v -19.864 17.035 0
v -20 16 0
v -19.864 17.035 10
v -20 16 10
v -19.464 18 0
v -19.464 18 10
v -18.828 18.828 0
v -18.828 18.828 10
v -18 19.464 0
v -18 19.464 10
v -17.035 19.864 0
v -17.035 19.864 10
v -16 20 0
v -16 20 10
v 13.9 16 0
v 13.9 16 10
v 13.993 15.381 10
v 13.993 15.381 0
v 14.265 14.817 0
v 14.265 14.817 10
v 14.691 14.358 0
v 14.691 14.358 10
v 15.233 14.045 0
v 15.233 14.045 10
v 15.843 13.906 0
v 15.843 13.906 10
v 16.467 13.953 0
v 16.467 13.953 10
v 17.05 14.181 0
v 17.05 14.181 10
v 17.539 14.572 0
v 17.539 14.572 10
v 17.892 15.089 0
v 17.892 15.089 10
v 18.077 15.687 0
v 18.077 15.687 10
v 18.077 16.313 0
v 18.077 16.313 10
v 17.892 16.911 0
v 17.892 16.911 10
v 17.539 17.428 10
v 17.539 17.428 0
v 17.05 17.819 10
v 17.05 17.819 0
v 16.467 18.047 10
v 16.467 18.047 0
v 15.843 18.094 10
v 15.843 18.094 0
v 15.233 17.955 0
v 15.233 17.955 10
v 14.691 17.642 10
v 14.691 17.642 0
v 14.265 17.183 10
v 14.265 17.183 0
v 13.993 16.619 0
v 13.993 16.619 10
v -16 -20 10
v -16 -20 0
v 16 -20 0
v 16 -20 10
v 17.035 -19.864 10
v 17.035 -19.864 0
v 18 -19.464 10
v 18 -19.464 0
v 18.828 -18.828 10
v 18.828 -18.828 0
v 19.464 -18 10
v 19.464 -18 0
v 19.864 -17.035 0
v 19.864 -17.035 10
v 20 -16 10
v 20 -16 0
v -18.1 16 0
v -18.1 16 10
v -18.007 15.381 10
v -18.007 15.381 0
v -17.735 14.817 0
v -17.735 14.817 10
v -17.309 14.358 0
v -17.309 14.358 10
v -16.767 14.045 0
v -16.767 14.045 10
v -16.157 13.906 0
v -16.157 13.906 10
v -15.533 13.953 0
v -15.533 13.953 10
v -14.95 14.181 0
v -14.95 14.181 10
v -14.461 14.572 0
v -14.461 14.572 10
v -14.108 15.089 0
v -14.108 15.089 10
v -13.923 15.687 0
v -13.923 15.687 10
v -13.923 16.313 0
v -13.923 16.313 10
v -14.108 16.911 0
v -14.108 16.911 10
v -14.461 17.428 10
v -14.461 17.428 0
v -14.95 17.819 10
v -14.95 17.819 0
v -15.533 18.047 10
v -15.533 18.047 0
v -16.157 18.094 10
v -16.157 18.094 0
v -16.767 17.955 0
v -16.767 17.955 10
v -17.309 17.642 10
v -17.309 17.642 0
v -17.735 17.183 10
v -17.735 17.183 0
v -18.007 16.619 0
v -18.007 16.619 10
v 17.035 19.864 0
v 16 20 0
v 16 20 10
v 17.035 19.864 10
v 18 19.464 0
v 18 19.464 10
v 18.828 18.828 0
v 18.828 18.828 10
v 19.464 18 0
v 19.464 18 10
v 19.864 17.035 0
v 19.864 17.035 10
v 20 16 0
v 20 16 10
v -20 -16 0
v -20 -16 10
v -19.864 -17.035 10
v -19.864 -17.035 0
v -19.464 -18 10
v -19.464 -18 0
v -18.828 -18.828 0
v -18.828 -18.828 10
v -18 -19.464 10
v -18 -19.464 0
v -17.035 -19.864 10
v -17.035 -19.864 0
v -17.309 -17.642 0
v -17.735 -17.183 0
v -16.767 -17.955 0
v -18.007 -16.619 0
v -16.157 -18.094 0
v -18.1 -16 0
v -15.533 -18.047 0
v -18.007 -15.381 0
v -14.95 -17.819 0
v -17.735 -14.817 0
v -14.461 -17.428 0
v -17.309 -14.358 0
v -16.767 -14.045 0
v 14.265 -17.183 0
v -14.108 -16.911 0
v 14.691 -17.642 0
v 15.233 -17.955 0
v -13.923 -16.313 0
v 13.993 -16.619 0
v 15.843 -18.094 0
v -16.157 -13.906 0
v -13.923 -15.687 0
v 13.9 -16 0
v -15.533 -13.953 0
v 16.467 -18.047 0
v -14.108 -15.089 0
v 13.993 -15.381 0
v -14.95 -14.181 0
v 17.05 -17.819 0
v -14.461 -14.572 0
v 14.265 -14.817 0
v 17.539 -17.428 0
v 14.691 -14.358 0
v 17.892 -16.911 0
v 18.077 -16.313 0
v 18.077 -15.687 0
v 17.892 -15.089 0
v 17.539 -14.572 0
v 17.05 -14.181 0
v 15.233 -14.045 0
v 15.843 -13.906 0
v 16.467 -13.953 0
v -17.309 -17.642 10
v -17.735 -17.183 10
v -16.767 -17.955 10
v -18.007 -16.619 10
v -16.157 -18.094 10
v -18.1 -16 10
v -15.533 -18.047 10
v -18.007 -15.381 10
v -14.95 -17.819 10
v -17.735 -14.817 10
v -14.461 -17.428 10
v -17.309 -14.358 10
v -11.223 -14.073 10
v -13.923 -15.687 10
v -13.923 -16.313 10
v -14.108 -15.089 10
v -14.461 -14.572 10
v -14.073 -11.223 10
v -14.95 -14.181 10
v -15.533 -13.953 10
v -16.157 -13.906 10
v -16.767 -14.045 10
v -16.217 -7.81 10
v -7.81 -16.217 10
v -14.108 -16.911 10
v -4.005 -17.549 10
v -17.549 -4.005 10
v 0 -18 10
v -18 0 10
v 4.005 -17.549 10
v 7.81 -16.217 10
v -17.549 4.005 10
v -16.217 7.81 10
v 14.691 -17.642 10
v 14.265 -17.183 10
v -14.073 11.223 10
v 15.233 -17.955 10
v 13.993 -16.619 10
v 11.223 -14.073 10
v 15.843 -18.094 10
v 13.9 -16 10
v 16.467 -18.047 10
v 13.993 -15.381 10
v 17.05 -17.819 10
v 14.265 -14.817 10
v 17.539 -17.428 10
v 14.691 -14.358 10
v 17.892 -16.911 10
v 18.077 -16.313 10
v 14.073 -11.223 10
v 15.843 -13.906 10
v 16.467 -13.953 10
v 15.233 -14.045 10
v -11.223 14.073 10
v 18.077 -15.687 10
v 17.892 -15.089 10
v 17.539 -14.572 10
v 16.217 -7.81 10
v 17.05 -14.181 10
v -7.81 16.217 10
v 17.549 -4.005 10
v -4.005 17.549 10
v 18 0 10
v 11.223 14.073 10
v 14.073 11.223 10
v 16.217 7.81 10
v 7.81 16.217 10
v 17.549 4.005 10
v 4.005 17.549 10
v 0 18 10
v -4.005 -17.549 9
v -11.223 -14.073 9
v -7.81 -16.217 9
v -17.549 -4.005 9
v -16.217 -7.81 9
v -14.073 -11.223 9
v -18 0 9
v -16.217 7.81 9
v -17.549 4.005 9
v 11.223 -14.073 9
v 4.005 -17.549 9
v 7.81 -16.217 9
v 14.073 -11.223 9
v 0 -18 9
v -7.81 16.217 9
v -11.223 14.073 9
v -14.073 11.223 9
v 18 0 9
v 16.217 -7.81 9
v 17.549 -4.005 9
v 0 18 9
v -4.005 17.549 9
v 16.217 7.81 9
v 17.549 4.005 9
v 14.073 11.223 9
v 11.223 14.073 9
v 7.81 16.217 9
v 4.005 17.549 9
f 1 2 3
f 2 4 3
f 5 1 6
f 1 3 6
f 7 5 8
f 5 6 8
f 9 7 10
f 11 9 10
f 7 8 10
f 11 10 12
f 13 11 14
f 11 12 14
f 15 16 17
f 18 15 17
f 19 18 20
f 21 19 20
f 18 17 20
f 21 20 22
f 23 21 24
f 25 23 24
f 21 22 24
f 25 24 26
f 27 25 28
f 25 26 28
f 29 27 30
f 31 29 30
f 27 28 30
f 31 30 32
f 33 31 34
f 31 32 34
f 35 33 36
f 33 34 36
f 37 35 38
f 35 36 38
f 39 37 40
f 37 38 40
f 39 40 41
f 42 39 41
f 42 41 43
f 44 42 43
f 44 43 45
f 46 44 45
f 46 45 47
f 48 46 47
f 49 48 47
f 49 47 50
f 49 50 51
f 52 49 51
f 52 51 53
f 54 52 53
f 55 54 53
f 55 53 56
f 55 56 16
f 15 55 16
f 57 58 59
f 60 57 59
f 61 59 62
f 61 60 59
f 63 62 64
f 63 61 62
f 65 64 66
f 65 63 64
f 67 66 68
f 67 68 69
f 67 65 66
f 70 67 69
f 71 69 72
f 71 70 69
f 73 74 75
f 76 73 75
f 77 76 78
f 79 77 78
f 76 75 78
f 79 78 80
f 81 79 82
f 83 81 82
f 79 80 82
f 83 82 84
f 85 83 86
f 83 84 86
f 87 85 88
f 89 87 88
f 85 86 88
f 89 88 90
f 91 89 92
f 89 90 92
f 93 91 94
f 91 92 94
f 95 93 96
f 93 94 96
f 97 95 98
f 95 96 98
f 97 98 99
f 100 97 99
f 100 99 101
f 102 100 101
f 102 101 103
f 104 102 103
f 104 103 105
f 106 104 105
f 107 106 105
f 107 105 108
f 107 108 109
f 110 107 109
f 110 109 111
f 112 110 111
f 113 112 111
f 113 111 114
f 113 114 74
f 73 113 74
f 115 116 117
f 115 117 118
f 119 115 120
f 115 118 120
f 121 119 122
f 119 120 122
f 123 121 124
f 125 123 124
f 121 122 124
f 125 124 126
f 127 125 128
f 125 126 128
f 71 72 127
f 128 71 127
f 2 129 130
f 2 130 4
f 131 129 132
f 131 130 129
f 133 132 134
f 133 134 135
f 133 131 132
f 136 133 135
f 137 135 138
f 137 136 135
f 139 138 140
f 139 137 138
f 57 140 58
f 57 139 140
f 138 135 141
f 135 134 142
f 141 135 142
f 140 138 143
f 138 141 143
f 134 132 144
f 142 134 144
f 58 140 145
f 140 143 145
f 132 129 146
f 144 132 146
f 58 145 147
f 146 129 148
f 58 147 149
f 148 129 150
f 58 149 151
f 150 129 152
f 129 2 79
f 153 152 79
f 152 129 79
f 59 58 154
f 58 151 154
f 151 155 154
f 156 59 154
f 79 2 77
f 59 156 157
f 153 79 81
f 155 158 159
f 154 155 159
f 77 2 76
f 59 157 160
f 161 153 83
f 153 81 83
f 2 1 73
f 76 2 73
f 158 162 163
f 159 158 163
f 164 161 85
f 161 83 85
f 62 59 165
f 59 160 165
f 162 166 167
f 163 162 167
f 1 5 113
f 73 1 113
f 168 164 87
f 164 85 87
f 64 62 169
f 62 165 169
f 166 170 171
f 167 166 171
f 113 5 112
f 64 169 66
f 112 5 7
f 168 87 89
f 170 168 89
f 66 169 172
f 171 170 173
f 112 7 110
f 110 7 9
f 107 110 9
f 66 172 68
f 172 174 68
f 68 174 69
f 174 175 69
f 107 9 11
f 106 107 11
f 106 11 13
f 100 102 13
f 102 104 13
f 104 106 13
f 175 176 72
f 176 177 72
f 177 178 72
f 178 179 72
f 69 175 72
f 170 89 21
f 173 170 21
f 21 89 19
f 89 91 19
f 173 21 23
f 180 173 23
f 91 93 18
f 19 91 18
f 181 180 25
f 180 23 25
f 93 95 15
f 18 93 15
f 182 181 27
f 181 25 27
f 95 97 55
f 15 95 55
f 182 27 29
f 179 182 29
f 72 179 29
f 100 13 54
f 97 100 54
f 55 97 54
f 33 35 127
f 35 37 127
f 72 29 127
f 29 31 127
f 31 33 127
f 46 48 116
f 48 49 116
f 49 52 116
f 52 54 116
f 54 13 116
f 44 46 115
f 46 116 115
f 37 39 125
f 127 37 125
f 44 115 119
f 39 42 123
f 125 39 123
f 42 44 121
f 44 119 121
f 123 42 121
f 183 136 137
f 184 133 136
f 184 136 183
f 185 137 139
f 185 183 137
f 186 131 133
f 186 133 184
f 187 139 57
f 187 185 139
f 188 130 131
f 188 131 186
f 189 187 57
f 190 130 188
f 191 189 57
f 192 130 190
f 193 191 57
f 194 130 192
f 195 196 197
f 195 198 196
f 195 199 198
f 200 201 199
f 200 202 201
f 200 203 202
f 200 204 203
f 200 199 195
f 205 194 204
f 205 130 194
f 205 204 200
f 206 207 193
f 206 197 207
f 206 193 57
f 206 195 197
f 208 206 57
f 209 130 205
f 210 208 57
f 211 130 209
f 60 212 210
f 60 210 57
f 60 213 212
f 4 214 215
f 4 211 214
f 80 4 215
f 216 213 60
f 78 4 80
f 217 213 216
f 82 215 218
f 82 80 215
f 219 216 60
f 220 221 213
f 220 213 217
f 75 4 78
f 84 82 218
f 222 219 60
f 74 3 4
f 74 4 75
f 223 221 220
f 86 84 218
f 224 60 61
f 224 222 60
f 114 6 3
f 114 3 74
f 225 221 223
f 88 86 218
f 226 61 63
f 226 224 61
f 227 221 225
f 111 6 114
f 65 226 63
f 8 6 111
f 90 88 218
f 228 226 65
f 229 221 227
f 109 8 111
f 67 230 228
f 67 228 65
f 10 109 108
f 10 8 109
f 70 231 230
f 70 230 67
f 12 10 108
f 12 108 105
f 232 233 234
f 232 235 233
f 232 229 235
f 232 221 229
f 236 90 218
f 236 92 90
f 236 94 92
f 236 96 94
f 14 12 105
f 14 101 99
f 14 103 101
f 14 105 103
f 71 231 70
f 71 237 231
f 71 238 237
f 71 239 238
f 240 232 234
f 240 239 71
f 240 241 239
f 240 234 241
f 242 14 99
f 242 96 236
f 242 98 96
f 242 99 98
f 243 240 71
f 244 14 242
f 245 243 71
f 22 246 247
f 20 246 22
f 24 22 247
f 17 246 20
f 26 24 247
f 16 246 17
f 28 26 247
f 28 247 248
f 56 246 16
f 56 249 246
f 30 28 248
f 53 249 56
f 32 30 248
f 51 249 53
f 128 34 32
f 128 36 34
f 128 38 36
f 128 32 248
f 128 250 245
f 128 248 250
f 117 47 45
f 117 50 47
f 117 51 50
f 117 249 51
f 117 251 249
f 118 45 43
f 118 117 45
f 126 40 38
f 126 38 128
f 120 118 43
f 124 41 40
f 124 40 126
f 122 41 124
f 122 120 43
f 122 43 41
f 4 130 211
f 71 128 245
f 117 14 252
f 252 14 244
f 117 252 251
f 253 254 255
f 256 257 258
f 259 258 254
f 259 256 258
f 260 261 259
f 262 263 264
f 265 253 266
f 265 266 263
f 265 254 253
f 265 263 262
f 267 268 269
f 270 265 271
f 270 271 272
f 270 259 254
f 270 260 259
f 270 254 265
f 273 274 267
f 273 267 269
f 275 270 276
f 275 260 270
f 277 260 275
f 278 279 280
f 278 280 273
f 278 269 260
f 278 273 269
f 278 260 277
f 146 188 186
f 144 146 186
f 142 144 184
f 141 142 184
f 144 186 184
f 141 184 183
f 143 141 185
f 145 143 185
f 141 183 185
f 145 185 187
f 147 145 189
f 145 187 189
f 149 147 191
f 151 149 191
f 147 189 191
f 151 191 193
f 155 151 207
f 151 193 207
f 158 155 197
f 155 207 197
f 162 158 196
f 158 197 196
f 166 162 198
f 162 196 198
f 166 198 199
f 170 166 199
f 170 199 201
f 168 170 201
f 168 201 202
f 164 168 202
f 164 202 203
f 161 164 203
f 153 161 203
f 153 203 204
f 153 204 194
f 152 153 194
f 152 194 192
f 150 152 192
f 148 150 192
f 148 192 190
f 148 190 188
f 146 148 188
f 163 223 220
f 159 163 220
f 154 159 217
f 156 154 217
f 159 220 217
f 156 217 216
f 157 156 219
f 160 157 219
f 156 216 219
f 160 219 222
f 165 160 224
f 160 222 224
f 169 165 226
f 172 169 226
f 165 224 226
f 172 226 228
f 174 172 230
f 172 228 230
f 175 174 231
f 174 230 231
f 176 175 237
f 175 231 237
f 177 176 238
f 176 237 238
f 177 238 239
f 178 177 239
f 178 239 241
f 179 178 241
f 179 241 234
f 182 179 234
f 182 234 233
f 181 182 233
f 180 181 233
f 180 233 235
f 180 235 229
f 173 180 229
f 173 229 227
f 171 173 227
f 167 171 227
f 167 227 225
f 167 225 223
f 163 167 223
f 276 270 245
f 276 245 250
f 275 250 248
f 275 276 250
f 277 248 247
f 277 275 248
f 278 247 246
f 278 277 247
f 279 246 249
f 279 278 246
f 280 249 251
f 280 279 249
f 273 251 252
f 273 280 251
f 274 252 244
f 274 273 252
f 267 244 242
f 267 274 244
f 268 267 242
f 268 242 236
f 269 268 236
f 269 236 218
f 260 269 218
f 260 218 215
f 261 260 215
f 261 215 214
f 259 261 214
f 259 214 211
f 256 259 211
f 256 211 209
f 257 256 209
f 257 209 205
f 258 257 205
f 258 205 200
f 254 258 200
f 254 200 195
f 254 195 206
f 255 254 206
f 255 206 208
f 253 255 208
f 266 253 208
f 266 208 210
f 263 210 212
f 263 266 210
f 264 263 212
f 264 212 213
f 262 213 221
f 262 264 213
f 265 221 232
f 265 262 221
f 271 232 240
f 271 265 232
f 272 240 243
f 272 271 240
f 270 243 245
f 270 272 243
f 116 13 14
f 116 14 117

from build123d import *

# Parameters (mm, degrees)
F0_W     = 40
F0_H     = 40
F0_R     = 18
F1_DEPTH = 10
F2_DEPTH = 9
F3_D     = 4.2
F4_R     = 4


with BuildPart() as f1:
    # F0 (on Top) → F1 (new body)
    with BuildSketch(Plane.XY):
        Rectangle(F0_W, F0_H)
        Circle(F0_R, mode=Mode.SUBTRACT)
    extrude(amount=F1_DEPTH)

    # F0 (on Top) → F2 (join)
    with BuildSketch(Plane.XY):
        Circle(F0_R)
    extrude(amount=F2_DEPTH)

    # F3 (through all)
    with Locations(Plane(origin=(0, 0, 0), x_dir=(1, 0, 0), z_dir=(0, 0, -1))):
        with Locations((-16, 16), (-16, -16), (16, -16), (16, 16)):
            Hole(F3_D / 2)

    # F4
    f4_edges = [f1.edges().sort_by_distance(p)[0] for p in [
        (-20, -20, 5),
        (-20, 20, 5),
        (20, 20, 5),
        (20, -20, 5),
    ]]
    fillet(f4_edges, radius=F4_R)


solid = f1.part
